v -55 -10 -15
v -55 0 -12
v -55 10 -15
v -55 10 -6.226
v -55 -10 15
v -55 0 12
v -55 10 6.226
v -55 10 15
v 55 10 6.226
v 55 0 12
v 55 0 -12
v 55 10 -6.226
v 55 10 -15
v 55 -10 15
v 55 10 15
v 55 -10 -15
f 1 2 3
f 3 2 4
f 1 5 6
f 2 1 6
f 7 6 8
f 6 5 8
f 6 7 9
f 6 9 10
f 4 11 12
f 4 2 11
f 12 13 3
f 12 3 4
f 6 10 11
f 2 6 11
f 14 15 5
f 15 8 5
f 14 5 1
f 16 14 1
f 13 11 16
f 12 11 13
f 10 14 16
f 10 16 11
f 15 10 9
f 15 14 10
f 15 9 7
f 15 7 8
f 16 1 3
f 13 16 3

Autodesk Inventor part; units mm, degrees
ref_plane "YZ Plane" through (0, 0, 0) normal (1, 0, 0) x (0, 1, 0)
ref_plane "XZ Plane" through (0, 0, 0) normal (0, 1, 0) x (-1, 0, 0)
ref_plane "XY Plane" through (0, 0, 0) normal (0, 0, 1) x (1, 0, 0)
sketch "Sketch4" plane through (0, 0, 0) normal (1, 0, 0) x (0, 1, 0)
  line L0 (0, 0) -> (0, -12)
  line L1 (0, -12) -> (10, -6.2265)
  line L2 (10, -6.2265) -> (10, 6.2265) construction
  line L3 (10, 6.2265) -> (0, 12)
  line L4 (0, 12) -> (0, 0)
  line L5 (0, 0) -> (10, 0) construction
  line L6 (10, 6.2265) -> (10, 15)
  line L7 (10, 15) -> (-10, 15)
  line L8 (-10, 15) -> (-10, -15)
  line L9 (-10, -15) -> (10, -15)
  line L10 (10, -15) -> (10, -6.2265)
  dimension "d31" = 60
  dimension "d32" = 60
  dimension "d33" = 10
  dimension "d34" = 12
  dimension "d43" = 10
  dimension "d44" = 30
extrude "Extrusion3" add sketch "Sketch4" along normal mid plane 110
properties part number "Runway" material "Acero, carbono"
